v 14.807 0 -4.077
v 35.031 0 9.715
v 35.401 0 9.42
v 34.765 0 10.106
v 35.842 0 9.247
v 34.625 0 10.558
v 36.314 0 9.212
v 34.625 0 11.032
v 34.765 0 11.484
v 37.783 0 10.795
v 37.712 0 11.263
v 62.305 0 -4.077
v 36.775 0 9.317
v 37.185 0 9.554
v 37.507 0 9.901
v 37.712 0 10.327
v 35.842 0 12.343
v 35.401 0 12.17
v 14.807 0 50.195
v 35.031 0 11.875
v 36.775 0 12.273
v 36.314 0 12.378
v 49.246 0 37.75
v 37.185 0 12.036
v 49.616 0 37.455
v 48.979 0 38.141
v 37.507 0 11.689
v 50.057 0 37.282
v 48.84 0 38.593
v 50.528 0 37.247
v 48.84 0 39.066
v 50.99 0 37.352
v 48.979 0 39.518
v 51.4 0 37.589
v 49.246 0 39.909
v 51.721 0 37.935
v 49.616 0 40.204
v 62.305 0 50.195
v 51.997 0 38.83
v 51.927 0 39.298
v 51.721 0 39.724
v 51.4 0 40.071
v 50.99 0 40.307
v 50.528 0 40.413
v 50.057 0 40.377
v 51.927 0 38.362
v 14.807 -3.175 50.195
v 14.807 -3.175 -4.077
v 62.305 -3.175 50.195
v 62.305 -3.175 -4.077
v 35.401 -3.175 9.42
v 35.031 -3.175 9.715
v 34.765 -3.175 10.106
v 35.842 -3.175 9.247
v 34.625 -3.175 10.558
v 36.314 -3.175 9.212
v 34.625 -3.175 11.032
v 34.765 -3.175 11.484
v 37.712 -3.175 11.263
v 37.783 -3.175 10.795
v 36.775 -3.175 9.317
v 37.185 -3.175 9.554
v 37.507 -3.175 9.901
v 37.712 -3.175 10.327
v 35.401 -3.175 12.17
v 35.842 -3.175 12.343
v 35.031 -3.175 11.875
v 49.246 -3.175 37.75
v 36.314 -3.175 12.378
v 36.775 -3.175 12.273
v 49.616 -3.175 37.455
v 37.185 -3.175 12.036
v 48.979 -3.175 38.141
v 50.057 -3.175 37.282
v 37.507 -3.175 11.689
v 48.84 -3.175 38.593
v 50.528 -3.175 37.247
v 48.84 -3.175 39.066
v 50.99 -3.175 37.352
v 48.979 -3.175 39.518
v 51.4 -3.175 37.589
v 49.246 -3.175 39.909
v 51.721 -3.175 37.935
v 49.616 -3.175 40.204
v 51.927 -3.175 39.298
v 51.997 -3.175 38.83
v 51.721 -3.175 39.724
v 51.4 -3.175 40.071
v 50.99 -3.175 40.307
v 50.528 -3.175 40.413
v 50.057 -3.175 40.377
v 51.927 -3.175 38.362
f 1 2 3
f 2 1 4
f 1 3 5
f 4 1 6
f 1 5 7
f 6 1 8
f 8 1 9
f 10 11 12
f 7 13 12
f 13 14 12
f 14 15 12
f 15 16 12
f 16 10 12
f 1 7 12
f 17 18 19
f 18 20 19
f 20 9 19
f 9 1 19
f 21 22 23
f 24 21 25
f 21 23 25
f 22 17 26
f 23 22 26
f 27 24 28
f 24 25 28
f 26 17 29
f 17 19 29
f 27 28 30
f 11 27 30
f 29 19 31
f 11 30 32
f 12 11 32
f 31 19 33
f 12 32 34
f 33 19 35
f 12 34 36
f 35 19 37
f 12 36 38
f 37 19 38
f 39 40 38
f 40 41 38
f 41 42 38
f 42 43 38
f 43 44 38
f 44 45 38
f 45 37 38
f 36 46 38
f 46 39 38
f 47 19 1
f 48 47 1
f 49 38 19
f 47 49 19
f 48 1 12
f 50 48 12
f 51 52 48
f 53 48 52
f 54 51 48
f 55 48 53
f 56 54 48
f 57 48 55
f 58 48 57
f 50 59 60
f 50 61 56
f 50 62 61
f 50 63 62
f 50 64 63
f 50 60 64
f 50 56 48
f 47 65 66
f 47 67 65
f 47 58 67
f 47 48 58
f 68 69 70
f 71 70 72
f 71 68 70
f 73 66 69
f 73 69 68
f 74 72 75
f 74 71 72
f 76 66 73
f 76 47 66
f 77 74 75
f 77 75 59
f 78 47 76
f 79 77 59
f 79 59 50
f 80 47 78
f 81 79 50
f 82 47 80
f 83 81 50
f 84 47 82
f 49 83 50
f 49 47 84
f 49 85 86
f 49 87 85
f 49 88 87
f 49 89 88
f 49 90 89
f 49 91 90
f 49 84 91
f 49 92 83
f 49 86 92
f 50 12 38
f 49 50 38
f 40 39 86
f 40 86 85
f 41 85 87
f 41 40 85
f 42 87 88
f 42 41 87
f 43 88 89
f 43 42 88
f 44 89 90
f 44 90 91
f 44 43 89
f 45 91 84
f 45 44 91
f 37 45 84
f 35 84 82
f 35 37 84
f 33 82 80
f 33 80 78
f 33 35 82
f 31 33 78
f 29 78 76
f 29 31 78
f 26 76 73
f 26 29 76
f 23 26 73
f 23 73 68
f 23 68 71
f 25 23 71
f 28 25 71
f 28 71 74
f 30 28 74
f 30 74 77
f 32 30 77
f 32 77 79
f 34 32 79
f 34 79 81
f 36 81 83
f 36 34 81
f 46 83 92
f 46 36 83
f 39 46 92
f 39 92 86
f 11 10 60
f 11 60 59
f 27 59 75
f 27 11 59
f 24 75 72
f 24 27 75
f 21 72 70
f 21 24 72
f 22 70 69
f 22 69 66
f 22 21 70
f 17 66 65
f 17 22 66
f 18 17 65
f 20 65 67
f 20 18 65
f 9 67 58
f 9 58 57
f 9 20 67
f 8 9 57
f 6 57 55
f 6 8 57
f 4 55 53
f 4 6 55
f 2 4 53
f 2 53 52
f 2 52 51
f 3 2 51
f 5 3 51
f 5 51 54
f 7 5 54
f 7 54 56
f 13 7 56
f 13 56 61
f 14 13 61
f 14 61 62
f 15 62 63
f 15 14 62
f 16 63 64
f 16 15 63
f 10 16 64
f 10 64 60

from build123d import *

# Parameters (mm, degrees)
F0_R     = 1.5875
F1_DEPTH = 3.175


with BuildPart() as f1:
    # F0 (on Front) → F1 (new body)
    with BuildSketch(Plane.XZ):
        with BuildLine():
            ThreePointArc((56.832502, 10.795001), (53.780715, 21.595422), (45.527925, 29.201602))
            ThreePointArc((45.527925, 29.201602), (19.370967, 22.747333), (21.886096, -4.076502))
            Line((21.886096, -4.076502), (50.503909, -4.076502))
            ThreePointArc((50.503909, -4.076502), (55.184558, 2.713963), (56.832502, 10.795001))
        make_face()
        with Locations((36.195002, 10.795001)):
            Circle(F0_R, mode=Mode.SUBTRACT)
        with BuildLine():
            ThreePointArc((21.886096, -4.076502), (19.370967, 22.747333), (45.527925, 29.201602))
            ThreePointArc((45.527925, 29.201602), (53.780715, 21.595422), (56.832502, 10.795001))
            ThreePointArc((56.832502, 10.795001), (55.184558, 2.713963), (50.503909, -4.076502))
            Line((50.503909, -4.076502), (62.305046, -4.076502))
            Line((62.305046, -4.076502), (62.305046, 50.195314))
            Line((62.305046, 50.195314), (14.807046, 50.195314))
            Line((14.807046, 50.195314), (14.807046, -4.076502))
            Line((14.807046, -4.076502), (21.886096, -4.076502))
        make_face()
        with BuildLine():
            ThreePointArc((45.527925, 29.201602), (44.760311, 48.028351), (61.204762, 38.82967))
            ThreePointArc((61.204762, 38.82967), (56.059213, 29.630989), (45.527925, 29.201602))
        make_face(mode=Mode.SUBTRACT)
        with BuildLine():
            ThreePointArc((45.527925, 29.201602), (56.059213, 29.630989), (61.204762, 38.82967))
            ThreePointArc((61.204762, 38.82967), (44.760311, 48.028351), (45.527925, 29.201602))
        make_face()
        with Locations((50.409762, 38.82967)):
            Circle(F0_R, mode=Mode.SUBTRACT)
    extrude(amount=F1_DEPTH)


solid = f1.part
